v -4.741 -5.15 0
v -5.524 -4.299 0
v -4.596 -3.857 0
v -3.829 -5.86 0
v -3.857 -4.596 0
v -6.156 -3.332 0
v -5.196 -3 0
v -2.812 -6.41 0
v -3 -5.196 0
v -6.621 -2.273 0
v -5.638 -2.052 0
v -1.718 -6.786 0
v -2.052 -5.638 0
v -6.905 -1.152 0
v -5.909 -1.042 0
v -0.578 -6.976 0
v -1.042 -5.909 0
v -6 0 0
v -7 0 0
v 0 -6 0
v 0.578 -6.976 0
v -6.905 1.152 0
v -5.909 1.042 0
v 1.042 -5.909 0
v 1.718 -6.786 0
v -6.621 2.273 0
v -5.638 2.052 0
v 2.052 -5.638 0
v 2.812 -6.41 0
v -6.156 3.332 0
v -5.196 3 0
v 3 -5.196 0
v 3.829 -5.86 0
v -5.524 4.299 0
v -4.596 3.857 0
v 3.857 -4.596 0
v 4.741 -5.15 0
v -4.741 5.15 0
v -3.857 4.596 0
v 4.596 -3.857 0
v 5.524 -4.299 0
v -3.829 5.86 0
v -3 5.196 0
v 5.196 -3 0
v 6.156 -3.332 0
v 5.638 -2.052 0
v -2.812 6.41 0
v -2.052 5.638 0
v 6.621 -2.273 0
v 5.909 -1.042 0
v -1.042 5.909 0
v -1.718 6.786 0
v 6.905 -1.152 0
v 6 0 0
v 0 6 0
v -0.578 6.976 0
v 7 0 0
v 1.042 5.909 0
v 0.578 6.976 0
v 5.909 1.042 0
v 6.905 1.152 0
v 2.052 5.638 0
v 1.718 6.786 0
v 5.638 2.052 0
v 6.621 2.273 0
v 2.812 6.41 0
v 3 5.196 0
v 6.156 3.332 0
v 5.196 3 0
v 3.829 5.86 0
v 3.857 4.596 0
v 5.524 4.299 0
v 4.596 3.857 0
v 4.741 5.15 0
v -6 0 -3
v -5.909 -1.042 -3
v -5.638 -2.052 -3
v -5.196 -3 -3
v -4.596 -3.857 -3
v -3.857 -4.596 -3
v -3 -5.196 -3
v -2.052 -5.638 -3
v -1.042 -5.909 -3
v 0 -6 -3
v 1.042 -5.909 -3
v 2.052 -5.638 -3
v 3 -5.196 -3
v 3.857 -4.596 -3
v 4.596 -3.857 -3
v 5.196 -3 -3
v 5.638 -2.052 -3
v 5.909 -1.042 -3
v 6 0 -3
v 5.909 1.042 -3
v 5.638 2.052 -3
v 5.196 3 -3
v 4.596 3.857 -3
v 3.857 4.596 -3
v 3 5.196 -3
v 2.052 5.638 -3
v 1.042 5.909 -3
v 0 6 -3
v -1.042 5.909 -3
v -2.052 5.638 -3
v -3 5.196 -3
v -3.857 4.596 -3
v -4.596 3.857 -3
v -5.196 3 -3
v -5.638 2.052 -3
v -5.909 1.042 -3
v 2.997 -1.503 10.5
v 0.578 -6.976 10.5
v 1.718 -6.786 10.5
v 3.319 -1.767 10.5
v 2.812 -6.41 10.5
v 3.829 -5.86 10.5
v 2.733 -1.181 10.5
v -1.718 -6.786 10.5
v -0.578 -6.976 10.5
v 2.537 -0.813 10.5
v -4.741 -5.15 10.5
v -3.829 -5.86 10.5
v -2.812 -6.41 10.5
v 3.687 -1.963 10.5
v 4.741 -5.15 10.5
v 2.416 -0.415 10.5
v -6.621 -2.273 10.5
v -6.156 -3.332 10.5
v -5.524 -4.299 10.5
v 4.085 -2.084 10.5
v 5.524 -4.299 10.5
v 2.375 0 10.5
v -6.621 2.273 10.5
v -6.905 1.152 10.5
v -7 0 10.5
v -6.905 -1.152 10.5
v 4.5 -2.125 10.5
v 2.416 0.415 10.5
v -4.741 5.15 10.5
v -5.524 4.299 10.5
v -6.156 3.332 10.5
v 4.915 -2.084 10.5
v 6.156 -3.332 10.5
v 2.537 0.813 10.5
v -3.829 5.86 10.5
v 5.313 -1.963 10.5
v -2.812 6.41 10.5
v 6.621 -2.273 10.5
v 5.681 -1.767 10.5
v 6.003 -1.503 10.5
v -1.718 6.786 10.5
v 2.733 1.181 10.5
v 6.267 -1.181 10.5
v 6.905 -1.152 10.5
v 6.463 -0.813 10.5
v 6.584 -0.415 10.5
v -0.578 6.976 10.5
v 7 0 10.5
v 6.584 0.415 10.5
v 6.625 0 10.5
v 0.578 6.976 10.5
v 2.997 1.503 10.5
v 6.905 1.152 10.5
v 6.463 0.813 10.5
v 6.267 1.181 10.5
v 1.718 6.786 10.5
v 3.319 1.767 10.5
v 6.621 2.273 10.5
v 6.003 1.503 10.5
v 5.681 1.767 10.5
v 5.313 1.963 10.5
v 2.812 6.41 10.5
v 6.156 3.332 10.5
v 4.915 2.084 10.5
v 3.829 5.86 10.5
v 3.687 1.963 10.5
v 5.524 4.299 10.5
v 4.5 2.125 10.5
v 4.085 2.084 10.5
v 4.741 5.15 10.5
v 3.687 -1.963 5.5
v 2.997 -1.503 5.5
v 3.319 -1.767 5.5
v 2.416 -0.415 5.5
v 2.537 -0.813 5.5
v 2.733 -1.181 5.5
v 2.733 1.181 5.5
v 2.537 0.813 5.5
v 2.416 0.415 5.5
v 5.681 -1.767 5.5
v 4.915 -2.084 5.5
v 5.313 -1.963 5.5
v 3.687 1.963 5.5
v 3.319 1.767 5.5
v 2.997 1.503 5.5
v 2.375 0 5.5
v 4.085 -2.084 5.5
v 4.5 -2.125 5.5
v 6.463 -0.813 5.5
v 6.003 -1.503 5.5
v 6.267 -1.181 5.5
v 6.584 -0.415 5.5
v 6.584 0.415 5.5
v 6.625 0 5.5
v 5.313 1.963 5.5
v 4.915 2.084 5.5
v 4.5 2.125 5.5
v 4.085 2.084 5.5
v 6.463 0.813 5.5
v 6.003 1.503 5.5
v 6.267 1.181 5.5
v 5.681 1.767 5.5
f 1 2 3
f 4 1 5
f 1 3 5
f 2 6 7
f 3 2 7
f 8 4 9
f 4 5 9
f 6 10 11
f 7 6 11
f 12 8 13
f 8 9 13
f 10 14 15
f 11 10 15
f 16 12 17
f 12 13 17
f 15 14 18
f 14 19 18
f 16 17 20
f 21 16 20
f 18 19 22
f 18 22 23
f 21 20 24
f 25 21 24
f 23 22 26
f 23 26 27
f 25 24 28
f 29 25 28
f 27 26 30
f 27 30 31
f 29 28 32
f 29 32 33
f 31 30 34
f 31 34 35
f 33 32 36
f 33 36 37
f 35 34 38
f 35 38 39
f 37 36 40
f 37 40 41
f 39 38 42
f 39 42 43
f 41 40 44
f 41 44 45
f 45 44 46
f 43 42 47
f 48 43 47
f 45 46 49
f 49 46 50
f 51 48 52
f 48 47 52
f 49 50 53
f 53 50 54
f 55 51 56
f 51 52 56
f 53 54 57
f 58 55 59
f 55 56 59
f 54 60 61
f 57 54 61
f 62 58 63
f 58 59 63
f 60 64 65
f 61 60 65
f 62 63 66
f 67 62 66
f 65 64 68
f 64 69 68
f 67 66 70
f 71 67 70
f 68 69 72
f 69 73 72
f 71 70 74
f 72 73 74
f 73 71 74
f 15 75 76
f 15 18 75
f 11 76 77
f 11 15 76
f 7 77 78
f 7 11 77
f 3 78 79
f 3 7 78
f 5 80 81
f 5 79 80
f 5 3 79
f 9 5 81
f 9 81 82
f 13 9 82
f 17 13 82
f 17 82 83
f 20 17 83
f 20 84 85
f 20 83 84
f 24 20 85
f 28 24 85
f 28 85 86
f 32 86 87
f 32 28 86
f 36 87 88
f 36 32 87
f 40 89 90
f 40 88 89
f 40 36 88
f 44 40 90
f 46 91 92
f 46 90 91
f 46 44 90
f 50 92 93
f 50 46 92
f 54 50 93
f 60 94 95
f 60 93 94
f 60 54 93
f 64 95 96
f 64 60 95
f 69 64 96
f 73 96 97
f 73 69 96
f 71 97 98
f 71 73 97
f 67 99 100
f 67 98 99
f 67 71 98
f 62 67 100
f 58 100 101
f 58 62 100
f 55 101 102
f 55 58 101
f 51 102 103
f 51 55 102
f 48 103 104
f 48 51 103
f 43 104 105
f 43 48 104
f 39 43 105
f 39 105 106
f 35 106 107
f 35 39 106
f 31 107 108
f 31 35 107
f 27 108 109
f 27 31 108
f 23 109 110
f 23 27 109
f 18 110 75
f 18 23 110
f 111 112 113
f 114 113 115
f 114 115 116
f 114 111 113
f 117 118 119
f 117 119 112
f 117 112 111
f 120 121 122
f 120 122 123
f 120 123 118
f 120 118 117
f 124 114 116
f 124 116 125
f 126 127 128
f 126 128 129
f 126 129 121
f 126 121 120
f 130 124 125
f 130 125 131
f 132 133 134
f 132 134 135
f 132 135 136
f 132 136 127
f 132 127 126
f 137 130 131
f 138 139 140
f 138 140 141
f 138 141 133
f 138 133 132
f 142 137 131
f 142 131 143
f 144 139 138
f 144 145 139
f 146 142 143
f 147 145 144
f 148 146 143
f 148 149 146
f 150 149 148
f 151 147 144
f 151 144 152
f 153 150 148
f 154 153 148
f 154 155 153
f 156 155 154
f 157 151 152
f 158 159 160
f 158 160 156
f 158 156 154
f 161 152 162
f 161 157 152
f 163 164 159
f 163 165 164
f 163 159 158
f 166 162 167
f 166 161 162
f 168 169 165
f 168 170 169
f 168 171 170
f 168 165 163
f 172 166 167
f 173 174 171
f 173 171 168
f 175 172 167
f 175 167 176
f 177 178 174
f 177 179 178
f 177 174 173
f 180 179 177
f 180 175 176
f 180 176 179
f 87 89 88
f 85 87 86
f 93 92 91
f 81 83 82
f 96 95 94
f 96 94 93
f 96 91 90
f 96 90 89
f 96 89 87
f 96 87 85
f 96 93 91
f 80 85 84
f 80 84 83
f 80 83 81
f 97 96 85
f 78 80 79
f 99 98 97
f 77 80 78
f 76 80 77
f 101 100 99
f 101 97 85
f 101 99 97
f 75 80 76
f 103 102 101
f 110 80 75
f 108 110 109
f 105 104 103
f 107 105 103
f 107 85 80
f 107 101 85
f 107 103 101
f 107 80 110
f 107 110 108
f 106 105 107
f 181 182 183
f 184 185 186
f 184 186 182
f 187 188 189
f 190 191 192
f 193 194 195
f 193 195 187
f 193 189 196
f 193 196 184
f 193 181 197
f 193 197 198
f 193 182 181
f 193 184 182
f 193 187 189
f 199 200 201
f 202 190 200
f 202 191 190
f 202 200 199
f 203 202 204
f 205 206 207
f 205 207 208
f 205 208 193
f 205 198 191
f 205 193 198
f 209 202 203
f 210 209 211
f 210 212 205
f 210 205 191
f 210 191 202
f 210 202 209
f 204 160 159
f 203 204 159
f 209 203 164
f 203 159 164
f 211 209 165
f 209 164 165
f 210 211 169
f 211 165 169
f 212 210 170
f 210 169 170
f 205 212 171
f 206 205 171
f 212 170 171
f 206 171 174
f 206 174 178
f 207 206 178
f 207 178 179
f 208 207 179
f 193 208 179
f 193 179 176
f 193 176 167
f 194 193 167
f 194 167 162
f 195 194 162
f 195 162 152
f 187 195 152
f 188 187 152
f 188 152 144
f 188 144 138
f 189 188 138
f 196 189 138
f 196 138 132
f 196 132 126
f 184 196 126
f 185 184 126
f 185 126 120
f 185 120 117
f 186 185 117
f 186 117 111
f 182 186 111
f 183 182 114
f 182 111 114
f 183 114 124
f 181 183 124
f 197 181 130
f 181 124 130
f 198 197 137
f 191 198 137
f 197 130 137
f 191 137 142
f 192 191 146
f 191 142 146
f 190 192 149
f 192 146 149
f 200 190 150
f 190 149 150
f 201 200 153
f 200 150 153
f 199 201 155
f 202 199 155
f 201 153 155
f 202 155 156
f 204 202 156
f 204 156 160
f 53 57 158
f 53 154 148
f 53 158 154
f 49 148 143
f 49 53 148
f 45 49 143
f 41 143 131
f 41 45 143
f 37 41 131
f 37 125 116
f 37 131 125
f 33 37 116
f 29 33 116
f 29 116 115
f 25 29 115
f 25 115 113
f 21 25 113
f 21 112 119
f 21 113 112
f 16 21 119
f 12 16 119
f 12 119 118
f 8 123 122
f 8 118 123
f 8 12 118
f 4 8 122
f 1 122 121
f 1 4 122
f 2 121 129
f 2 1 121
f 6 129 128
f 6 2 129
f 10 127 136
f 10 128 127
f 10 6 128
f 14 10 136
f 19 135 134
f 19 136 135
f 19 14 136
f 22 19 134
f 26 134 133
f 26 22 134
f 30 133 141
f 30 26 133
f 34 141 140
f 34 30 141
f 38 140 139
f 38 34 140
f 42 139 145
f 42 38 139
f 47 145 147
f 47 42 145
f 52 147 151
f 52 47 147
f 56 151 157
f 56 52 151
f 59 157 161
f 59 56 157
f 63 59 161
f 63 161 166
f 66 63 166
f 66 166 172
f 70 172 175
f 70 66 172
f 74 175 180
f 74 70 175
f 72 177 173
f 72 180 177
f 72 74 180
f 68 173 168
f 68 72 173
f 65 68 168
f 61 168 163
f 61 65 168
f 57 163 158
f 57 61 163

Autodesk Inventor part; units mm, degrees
ref_plane "YZ Plane" through (0, 0, 0) normal (1, 0, 0) x (0, 1, 0)
ref_plane "XZ Plane" through (0, 0, 0) normal (0, 1, 0) x (-1, 0, 0)
ref_plane "XY Plane" through (0, 0, 0) normal (0, 0, 1) x (1, 0, 0)
sketch "Sketch1" plane through (0, 0, 0) normal (0, 0, 1) x (1, 0, 0)
  circle A0 centre (0, 0) radius 7
  arc A1 (-3.096, -4.5458) -> (5.2116, 1.7576) centre (0, 0) ccw projected
  point P0 (0, 0)
  dimension "d0" = 14
extrude "Extrusion1" add sketch "Sketch1" along normal blind 10.5
sketch "Sketch2" plane through (0, 0, 10.5) normal (0, 0, 1) x (1, 0, 0)
  circle A0 centre (0, 0) radius 7 projected
  line L0 (7, 0) -> (4.5, 0)
  circle A1 centre (4.5, 0) radius 2.125
  point P0 (0, 0)
  dimension "d3" = 2.5
  dimension "d4" = 4.25
extrude "Extrusion2" cut sketch "Sketch2" against normal blind 5 contours A1
sketch "Sketch3" plane through (0, 0, 0) normal (0, 0, -1) x (-1, 0, 0)
  circle A0 centre (0, 0) radius 5 projected
  circle A1 centre (0, 0) radius 7 projected
  circle A2 centre (0, 0) radius 6
  point P0 (0, 0)
  dimension "d7" = 12
extrude "Extrusion3" add sketch "Sketch3" along normal blind 3 contours A0 | A2
properties part number "RotationDisk"
